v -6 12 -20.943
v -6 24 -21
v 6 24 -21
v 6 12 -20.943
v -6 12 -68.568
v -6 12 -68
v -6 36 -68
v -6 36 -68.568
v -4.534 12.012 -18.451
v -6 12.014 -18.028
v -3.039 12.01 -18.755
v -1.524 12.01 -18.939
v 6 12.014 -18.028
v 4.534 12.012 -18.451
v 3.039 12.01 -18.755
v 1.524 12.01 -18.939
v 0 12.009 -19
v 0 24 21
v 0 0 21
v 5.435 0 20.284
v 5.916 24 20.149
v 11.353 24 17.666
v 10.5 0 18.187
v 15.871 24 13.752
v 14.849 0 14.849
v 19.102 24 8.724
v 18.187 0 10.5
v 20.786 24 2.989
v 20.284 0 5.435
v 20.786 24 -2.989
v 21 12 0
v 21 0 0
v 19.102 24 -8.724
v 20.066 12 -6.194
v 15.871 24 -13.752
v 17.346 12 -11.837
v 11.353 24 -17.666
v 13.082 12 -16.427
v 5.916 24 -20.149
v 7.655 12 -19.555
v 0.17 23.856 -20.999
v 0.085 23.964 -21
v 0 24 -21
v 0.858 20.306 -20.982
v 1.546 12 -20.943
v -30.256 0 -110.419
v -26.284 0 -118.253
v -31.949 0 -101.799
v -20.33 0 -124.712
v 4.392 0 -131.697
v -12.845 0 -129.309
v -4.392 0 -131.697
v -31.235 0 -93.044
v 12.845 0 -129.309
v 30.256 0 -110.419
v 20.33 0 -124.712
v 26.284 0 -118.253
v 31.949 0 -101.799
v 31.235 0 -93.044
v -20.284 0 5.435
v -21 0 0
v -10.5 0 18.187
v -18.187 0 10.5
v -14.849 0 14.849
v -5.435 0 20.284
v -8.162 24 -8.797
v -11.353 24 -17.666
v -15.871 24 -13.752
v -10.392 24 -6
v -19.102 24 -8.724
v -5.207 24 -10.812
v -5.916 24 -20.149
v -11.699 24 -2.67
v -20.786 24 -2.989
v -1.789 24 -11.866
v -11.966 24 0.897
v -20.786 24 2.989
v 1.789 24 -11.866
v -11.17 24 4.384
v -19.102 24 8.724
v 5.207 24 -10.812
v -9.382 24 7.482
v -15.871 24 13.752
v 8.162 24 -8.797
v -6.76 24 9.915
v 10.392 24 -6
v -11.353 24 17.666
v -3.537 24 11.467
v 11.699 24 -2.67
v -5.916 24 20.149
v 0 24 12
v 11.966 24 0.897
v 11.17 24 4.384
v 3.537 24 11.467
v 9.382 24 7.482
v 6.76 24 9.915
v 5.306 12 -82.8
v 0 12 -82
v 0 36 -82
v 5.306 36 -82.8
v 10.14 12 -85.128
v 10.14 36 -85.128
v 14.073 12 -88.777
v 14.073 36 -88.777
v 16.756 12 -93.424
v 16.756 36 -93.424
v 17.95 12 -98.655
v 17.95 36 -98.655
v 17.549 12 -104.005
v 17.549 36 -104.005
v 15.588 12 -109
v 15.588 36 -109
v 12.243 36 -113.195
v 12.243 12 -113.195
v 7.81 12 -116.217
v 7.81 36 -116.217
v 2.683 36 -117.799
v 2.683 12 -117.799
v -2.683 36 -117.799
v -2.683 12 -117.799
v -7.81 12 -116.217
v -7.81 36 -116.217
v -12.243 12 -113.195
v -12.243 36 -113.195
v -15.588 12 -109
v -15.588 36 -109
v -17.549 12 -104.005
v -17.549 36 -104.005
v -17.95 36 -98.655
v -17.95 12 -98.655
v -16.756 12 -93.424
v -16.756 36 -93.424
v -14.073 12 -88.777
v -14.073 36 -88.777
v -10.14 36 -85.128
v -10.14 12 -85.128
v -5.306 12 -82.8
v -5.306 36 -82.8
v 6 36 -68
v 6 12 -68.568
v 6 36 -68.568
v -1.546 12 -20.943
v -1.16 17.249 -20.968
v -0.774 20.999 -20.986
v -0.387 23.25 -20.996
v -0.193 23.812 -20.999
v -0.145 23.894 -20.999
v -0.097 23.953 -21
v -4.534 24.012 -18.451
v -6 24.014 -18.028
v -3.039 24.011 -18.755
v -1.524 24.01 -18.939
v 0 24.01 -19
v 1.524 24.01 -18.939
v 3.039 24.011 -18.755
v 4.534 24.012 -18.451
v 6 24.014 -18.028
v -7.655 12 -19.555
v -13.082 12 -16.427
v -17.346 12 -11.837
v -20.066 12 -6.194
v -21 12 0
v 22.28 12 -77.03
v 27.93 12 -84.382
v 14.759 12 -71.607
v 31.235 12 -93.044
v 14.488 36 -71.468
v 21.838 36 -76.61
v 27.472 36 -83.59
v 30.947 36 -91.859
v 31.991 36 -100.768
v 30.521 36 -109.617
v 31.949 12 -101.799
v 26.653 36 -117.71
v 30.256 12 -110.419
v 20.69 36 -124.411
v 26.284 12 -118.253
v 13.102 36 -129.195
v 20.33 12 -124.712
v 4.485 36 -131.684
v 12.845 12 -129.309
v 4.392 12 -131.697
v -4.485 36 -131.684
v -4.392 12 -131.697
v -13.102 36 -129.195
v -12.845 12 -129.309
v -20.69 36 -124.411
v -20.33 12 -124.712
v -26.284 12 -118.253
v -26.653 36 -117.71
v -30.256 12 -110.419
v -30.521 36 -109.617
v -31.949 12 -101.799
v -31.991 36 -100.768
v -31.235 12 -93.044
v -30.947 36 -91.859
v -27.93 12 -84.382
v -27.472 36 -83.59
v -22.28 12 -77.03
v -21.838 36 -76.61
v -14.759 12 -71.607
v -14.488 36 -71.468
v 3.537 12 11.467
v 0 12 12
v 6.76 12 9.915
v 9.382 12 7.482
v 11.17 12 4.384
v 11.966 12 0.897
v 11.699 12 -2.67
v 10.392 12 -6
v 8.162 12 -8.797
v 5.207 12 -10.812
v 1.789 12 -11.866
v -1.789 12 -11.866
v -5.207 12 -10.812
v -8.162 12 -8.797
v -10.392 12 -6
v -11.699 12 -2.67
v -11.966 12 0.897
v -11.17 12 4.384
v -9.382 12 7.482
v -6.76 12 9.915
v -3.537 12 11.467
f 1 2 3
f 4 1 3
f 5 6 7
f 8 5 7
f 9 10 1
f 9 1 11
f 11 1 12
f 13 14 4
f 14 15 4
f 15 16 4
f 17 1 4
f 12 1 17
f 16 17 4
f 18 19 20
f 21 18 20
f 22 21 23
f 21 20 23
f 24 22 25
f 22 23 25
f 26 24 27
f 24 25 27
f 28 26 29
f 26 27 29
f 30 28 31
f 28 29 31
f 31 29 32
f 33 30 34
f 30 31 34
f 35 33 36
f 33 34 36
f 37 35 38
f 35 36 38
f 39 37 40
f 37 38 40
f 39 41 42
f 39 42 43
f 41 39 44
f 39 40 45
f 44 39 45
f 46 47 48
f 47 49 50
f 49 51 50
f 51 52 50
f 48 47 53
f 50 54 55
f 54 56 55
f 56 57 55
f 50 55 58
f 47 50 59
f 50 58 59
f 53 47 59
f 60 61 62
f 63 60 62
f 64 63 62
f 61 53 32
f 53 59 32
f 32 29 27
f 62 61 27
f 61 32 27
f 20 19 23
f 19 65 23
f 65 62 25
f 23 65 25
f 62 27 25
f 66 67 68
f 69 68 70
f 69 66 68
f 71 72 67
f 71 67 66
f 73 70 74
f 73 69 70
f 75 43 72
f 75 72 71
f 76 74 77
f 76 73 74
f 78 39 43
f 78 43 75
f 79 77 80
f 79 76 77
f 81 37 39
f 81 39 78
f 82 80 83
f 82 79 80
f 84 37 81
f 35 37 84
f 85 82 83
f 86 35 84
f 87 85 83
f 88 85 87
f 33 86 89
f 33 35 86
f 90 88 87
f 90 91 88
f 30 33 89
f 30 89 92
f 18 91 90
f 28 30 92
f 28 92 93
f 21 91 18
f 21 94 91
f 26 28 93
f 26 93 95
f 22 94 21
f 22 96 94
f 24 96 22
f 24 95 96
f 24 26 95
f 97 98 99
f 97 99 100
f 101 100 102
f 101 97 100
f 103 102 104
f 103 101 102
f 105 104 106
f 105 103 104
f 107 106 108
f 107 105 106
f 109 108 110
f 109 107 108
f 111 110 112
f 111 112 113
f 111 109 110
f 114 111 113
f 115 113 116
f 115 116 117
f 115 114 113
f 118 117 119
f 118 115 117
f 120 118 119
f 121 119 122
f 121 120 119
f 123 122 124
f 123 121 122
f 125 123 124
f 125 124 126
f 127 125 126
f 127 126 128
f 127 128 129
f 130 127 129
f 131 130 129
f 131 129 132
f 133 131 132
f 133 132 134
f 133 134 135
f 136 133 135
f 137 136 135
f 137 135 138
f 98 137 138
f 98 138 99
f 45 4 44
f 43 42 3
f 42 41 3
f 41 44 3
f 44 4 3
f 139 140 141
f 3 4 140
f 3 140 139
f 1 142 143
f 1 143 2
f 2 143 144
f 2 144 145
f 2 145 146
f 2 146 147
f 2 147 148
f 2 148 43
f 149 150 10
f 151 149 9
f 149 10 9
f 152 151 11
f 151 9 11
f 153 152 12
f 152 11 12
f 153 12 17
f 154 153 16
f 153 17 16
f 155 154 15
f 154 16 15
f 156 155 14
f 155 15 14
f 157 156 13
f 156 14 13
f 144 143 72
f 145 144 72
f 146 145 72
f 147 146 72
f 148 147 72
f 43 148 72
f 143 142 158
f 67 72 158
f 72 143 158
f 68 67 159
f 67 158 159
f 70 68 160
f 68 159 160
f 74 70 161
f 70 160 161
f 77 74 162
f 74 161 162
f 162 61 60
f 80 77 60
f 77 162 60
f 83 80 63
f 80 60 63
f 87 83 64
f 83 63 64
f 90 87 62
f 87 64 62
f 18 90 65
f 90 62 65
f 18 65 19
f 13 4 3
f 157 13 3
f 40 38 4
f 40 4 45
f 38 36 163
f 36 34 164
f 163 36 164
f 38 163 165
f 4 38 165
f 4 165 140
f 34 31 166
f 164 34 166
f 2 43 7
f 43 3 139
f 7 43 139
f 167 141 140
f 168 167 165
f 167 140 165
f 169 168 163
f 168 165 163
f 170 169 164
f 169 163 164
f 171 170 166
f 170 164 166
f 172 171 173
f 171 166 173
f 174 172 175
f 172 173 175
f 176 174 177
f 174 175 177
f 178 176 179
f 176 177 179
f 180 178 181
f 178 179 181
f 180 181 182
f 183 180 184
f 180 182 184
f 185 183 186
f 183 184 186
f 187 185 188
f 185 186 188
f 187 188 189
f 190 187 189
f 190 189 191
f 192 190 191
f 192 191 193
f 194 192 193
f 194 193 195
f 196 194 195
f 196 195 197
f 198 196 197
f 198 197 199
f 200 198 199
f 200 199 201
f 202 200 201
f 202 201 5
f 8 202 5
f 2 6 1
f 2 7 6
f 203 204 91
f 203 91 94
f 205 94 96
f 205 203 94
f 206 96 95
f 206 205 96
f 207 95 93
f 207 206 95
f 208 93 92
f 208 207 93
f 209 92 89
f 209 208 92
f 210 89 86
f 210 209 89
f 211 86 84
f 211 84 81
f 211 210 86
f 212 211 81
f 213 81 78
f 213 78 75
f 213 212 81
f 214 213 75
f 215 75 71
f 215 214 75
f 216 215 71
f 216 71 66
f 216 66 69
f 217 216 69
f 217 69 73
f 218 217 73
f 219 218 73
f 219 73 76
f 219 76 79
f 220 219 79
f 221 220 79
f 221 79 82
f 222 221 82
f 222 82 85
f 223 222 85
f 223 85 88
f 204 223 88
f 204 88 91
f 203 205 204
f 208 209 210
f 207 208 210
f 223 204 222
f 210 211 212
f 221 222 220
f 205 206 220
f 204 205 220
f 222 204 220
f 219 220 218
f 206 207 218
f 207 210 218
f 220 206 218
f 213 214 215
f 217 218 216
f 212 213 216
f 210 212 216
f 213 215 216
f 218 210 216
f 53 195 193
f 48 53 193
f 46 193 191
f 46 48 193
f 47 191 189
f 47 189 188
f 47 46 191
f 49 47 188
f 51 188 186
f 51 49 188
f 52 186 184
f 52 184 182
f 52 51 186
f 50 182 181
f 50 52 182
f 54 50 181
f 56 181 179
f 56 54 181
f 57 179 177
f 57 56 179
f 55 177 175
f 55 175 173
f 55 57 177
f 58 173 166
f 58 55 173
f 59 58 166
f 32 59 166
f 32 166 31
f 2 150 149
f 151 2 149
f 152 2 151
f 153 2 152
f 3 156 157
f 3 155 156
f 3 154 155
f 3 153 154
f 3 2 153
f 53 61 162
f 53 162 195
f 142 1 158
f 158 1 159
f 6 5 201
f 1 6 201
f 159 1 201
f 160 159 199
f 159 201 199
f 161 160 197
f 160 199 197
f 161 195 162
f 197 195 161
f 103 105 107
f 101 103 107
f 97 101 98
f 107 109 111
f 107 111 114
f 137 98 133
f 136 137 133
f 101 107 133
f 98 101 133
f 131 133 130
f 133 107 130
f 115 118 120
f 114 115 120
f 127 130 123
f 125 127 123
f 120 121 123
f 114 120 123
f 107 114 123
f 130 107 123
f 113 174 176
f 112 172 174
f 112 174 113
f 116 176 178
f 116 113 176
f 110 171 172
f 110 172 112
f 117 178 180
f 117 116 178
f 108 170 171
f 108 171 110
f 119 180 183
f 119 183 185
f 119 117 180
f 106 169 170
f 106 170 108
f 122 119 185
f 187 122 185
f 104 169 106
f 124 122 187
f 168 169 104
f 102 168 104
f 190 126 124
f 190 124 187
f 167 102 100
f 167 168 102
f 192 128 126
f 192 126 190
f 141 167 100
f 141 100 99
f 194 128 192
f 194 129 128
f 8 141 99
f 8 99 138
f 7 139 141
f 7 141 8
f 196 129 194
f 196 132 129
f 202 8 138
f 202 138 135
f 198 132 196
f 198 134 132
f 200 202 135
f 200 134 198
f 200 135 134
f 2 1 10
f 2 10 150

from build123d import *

# Parameters (mm, degrees)
SKETCH1_R                 = 32
SKETCH1_R_2               = 18
BOSS_EXTRUDE1_DEPTH       = 36
SKETCH2_R                 = 21
SKETCH2_R_2               = 12
BOSS_EXTRUDE2_DEPTH       = 24
BOSS_EXTRUDE5_DEPTH       = 12
BOSS_EXTRUDE8_DEPTH       = 6
BOSS_EXTRUDE12_REACH      = 123.135
BOSS_EXTRUDE12_END_RADIUS = 19
SKETCH9_W                 = 12
SKETCH9_H                 = 12.000135411
SKETCH10_W                = 12
SKETCH10_H                = 24
BOSS_EXTRUDE13_DEPTH      = 0.567533


with BuildPart() as part:
    # Sketch1 → Boss-Extrude1 (new body)
    with BuildSketch(Plane(origin=(0, 0, 0), x_dir=(1, 0, 0), z_dir=(0, 1, 0))):
        with Locations(Location((0, 100, 0), (0, 0, 270))):
            Circle(SKETCH1_R)
        with Locations(Location((0, 100, 0), (0, 0, 270))):
            Circle(SKETCH1_R_2, mode=Mode.SUBTRACT)
    extrude(amount=BOSS_EXTRUDE1_DEPTH)



with BuildPart() as body_2:
    # Sketch2 → Boss-Extrude2 (new body)
    with BuildSketch(Plane(origin=(0, 0, 0), x_dir=(1, 0, 0), z_dir=(0, 1, 0))):
        with Locations(Location((0, 0, 0), (0, 0, 270))):
            Circle(SKETCH2_R)
        with Locations(Location((0, 0, 0), (0, 0, 270))):
            Circle(SKETCH2_R_2, mode=Mode.SUBTRACT)
    extrude(amount=BOSS_EXTRUDE2_DEPTH)


with BuildPart() as part_1:
    add(part.part)

    add(body_2.part)  # Boss-Extrude5 merges body 2
    # Sketch7 → Boss-Extrude5 (add)
    with BuildSketch(Plane(origin=(0, 0, 0), x_dir=(-1, 0, 0), z_dir=(0, -1, 0))):
        with BuildLine():
            Line((21, 0), (31.234858216, 93.044165596))
            ThreePointArc((31.234858216, 93.044165596), (0, 132), (-31.234858216, 93.044165596))
            Line((-31.234858216, 93.044165596), (-21, 0))
            ThreePointArc((-21, 0), (0, -21), (21, 0))
        make_face()
    extrude(amount=-BOSS_EXTRUDE5_DEPTH)



with BuildPart() as body_2_2:
    # Sketch8 → Boss-Extrude8 (new, symmetric)
    with BuildSketch(Plane(origin=(0, 0, 0), x_dir=(0, 0, -1), z_dir=(1, 0, 0))):
        Polygon((68, 12), (20.942992135, 12), (21, 24), (68, 36), align=None)
    extrude(amount=BOSS_EXTRUDE8_DEPTH, both=True)


with BuildPart() as body_3:
    # Boss-Extrude12: up to this cylinder (the profile starts outside it)
    boss_extrude12_end = Plane(origin=(0, 18, 0), z_dir=(0, -1, 0)) * Cylinder(BOSS_EXTRUDE12_END_RADIUS, 285.27, mode=Mode.PRIVATE)
    # Sketch9 → Boss-Extrude12 (new, up to the surface)
    with BuildSketch(Plane(origin=(0, -0.099219875, -20.88551291), x_dir=(1, 0, 0), z_dir=(0, 0.0047506018218450435, 0.9999887158274989)), mode=Mode.PRIVATE) as boss_extrude12_sk1:
        with Locations((0, 18.099424112)):
            Rectangle(SKETCH9_W, SKETCH9_H)
    boss_extrude12_tool1 = extrude(boss_extrude12_sk1.sketch, amount=BOSS_EXTRUDE12_REACH, mode=Mode.PRIVATE) - boss_extrude12_end
    add(boss_extrude12_tool1.solids().sort_by_distance((0, 18, -20.971496))[0])


with BuildPart() as part_2:
    add(part_1.part)

    add(body_2_2.part)  # Boss-Extrude13 merges body 2 2
    # Sketch10 → Boss-Extrude13 (add)
    with BuildSketch(Plane(origin=(0, 0, -68), x_dir=(-1, 0, 0), z_dir=(0, 0, -1))):
        with Locations((0, 24)):
            Rectangle(SKETCH10_W, SKETCH10_H)
    extrude(amount=BOSS_EXTRUDE13_DEPTH)


solid = Compound([body_3.part, part_2.part])
